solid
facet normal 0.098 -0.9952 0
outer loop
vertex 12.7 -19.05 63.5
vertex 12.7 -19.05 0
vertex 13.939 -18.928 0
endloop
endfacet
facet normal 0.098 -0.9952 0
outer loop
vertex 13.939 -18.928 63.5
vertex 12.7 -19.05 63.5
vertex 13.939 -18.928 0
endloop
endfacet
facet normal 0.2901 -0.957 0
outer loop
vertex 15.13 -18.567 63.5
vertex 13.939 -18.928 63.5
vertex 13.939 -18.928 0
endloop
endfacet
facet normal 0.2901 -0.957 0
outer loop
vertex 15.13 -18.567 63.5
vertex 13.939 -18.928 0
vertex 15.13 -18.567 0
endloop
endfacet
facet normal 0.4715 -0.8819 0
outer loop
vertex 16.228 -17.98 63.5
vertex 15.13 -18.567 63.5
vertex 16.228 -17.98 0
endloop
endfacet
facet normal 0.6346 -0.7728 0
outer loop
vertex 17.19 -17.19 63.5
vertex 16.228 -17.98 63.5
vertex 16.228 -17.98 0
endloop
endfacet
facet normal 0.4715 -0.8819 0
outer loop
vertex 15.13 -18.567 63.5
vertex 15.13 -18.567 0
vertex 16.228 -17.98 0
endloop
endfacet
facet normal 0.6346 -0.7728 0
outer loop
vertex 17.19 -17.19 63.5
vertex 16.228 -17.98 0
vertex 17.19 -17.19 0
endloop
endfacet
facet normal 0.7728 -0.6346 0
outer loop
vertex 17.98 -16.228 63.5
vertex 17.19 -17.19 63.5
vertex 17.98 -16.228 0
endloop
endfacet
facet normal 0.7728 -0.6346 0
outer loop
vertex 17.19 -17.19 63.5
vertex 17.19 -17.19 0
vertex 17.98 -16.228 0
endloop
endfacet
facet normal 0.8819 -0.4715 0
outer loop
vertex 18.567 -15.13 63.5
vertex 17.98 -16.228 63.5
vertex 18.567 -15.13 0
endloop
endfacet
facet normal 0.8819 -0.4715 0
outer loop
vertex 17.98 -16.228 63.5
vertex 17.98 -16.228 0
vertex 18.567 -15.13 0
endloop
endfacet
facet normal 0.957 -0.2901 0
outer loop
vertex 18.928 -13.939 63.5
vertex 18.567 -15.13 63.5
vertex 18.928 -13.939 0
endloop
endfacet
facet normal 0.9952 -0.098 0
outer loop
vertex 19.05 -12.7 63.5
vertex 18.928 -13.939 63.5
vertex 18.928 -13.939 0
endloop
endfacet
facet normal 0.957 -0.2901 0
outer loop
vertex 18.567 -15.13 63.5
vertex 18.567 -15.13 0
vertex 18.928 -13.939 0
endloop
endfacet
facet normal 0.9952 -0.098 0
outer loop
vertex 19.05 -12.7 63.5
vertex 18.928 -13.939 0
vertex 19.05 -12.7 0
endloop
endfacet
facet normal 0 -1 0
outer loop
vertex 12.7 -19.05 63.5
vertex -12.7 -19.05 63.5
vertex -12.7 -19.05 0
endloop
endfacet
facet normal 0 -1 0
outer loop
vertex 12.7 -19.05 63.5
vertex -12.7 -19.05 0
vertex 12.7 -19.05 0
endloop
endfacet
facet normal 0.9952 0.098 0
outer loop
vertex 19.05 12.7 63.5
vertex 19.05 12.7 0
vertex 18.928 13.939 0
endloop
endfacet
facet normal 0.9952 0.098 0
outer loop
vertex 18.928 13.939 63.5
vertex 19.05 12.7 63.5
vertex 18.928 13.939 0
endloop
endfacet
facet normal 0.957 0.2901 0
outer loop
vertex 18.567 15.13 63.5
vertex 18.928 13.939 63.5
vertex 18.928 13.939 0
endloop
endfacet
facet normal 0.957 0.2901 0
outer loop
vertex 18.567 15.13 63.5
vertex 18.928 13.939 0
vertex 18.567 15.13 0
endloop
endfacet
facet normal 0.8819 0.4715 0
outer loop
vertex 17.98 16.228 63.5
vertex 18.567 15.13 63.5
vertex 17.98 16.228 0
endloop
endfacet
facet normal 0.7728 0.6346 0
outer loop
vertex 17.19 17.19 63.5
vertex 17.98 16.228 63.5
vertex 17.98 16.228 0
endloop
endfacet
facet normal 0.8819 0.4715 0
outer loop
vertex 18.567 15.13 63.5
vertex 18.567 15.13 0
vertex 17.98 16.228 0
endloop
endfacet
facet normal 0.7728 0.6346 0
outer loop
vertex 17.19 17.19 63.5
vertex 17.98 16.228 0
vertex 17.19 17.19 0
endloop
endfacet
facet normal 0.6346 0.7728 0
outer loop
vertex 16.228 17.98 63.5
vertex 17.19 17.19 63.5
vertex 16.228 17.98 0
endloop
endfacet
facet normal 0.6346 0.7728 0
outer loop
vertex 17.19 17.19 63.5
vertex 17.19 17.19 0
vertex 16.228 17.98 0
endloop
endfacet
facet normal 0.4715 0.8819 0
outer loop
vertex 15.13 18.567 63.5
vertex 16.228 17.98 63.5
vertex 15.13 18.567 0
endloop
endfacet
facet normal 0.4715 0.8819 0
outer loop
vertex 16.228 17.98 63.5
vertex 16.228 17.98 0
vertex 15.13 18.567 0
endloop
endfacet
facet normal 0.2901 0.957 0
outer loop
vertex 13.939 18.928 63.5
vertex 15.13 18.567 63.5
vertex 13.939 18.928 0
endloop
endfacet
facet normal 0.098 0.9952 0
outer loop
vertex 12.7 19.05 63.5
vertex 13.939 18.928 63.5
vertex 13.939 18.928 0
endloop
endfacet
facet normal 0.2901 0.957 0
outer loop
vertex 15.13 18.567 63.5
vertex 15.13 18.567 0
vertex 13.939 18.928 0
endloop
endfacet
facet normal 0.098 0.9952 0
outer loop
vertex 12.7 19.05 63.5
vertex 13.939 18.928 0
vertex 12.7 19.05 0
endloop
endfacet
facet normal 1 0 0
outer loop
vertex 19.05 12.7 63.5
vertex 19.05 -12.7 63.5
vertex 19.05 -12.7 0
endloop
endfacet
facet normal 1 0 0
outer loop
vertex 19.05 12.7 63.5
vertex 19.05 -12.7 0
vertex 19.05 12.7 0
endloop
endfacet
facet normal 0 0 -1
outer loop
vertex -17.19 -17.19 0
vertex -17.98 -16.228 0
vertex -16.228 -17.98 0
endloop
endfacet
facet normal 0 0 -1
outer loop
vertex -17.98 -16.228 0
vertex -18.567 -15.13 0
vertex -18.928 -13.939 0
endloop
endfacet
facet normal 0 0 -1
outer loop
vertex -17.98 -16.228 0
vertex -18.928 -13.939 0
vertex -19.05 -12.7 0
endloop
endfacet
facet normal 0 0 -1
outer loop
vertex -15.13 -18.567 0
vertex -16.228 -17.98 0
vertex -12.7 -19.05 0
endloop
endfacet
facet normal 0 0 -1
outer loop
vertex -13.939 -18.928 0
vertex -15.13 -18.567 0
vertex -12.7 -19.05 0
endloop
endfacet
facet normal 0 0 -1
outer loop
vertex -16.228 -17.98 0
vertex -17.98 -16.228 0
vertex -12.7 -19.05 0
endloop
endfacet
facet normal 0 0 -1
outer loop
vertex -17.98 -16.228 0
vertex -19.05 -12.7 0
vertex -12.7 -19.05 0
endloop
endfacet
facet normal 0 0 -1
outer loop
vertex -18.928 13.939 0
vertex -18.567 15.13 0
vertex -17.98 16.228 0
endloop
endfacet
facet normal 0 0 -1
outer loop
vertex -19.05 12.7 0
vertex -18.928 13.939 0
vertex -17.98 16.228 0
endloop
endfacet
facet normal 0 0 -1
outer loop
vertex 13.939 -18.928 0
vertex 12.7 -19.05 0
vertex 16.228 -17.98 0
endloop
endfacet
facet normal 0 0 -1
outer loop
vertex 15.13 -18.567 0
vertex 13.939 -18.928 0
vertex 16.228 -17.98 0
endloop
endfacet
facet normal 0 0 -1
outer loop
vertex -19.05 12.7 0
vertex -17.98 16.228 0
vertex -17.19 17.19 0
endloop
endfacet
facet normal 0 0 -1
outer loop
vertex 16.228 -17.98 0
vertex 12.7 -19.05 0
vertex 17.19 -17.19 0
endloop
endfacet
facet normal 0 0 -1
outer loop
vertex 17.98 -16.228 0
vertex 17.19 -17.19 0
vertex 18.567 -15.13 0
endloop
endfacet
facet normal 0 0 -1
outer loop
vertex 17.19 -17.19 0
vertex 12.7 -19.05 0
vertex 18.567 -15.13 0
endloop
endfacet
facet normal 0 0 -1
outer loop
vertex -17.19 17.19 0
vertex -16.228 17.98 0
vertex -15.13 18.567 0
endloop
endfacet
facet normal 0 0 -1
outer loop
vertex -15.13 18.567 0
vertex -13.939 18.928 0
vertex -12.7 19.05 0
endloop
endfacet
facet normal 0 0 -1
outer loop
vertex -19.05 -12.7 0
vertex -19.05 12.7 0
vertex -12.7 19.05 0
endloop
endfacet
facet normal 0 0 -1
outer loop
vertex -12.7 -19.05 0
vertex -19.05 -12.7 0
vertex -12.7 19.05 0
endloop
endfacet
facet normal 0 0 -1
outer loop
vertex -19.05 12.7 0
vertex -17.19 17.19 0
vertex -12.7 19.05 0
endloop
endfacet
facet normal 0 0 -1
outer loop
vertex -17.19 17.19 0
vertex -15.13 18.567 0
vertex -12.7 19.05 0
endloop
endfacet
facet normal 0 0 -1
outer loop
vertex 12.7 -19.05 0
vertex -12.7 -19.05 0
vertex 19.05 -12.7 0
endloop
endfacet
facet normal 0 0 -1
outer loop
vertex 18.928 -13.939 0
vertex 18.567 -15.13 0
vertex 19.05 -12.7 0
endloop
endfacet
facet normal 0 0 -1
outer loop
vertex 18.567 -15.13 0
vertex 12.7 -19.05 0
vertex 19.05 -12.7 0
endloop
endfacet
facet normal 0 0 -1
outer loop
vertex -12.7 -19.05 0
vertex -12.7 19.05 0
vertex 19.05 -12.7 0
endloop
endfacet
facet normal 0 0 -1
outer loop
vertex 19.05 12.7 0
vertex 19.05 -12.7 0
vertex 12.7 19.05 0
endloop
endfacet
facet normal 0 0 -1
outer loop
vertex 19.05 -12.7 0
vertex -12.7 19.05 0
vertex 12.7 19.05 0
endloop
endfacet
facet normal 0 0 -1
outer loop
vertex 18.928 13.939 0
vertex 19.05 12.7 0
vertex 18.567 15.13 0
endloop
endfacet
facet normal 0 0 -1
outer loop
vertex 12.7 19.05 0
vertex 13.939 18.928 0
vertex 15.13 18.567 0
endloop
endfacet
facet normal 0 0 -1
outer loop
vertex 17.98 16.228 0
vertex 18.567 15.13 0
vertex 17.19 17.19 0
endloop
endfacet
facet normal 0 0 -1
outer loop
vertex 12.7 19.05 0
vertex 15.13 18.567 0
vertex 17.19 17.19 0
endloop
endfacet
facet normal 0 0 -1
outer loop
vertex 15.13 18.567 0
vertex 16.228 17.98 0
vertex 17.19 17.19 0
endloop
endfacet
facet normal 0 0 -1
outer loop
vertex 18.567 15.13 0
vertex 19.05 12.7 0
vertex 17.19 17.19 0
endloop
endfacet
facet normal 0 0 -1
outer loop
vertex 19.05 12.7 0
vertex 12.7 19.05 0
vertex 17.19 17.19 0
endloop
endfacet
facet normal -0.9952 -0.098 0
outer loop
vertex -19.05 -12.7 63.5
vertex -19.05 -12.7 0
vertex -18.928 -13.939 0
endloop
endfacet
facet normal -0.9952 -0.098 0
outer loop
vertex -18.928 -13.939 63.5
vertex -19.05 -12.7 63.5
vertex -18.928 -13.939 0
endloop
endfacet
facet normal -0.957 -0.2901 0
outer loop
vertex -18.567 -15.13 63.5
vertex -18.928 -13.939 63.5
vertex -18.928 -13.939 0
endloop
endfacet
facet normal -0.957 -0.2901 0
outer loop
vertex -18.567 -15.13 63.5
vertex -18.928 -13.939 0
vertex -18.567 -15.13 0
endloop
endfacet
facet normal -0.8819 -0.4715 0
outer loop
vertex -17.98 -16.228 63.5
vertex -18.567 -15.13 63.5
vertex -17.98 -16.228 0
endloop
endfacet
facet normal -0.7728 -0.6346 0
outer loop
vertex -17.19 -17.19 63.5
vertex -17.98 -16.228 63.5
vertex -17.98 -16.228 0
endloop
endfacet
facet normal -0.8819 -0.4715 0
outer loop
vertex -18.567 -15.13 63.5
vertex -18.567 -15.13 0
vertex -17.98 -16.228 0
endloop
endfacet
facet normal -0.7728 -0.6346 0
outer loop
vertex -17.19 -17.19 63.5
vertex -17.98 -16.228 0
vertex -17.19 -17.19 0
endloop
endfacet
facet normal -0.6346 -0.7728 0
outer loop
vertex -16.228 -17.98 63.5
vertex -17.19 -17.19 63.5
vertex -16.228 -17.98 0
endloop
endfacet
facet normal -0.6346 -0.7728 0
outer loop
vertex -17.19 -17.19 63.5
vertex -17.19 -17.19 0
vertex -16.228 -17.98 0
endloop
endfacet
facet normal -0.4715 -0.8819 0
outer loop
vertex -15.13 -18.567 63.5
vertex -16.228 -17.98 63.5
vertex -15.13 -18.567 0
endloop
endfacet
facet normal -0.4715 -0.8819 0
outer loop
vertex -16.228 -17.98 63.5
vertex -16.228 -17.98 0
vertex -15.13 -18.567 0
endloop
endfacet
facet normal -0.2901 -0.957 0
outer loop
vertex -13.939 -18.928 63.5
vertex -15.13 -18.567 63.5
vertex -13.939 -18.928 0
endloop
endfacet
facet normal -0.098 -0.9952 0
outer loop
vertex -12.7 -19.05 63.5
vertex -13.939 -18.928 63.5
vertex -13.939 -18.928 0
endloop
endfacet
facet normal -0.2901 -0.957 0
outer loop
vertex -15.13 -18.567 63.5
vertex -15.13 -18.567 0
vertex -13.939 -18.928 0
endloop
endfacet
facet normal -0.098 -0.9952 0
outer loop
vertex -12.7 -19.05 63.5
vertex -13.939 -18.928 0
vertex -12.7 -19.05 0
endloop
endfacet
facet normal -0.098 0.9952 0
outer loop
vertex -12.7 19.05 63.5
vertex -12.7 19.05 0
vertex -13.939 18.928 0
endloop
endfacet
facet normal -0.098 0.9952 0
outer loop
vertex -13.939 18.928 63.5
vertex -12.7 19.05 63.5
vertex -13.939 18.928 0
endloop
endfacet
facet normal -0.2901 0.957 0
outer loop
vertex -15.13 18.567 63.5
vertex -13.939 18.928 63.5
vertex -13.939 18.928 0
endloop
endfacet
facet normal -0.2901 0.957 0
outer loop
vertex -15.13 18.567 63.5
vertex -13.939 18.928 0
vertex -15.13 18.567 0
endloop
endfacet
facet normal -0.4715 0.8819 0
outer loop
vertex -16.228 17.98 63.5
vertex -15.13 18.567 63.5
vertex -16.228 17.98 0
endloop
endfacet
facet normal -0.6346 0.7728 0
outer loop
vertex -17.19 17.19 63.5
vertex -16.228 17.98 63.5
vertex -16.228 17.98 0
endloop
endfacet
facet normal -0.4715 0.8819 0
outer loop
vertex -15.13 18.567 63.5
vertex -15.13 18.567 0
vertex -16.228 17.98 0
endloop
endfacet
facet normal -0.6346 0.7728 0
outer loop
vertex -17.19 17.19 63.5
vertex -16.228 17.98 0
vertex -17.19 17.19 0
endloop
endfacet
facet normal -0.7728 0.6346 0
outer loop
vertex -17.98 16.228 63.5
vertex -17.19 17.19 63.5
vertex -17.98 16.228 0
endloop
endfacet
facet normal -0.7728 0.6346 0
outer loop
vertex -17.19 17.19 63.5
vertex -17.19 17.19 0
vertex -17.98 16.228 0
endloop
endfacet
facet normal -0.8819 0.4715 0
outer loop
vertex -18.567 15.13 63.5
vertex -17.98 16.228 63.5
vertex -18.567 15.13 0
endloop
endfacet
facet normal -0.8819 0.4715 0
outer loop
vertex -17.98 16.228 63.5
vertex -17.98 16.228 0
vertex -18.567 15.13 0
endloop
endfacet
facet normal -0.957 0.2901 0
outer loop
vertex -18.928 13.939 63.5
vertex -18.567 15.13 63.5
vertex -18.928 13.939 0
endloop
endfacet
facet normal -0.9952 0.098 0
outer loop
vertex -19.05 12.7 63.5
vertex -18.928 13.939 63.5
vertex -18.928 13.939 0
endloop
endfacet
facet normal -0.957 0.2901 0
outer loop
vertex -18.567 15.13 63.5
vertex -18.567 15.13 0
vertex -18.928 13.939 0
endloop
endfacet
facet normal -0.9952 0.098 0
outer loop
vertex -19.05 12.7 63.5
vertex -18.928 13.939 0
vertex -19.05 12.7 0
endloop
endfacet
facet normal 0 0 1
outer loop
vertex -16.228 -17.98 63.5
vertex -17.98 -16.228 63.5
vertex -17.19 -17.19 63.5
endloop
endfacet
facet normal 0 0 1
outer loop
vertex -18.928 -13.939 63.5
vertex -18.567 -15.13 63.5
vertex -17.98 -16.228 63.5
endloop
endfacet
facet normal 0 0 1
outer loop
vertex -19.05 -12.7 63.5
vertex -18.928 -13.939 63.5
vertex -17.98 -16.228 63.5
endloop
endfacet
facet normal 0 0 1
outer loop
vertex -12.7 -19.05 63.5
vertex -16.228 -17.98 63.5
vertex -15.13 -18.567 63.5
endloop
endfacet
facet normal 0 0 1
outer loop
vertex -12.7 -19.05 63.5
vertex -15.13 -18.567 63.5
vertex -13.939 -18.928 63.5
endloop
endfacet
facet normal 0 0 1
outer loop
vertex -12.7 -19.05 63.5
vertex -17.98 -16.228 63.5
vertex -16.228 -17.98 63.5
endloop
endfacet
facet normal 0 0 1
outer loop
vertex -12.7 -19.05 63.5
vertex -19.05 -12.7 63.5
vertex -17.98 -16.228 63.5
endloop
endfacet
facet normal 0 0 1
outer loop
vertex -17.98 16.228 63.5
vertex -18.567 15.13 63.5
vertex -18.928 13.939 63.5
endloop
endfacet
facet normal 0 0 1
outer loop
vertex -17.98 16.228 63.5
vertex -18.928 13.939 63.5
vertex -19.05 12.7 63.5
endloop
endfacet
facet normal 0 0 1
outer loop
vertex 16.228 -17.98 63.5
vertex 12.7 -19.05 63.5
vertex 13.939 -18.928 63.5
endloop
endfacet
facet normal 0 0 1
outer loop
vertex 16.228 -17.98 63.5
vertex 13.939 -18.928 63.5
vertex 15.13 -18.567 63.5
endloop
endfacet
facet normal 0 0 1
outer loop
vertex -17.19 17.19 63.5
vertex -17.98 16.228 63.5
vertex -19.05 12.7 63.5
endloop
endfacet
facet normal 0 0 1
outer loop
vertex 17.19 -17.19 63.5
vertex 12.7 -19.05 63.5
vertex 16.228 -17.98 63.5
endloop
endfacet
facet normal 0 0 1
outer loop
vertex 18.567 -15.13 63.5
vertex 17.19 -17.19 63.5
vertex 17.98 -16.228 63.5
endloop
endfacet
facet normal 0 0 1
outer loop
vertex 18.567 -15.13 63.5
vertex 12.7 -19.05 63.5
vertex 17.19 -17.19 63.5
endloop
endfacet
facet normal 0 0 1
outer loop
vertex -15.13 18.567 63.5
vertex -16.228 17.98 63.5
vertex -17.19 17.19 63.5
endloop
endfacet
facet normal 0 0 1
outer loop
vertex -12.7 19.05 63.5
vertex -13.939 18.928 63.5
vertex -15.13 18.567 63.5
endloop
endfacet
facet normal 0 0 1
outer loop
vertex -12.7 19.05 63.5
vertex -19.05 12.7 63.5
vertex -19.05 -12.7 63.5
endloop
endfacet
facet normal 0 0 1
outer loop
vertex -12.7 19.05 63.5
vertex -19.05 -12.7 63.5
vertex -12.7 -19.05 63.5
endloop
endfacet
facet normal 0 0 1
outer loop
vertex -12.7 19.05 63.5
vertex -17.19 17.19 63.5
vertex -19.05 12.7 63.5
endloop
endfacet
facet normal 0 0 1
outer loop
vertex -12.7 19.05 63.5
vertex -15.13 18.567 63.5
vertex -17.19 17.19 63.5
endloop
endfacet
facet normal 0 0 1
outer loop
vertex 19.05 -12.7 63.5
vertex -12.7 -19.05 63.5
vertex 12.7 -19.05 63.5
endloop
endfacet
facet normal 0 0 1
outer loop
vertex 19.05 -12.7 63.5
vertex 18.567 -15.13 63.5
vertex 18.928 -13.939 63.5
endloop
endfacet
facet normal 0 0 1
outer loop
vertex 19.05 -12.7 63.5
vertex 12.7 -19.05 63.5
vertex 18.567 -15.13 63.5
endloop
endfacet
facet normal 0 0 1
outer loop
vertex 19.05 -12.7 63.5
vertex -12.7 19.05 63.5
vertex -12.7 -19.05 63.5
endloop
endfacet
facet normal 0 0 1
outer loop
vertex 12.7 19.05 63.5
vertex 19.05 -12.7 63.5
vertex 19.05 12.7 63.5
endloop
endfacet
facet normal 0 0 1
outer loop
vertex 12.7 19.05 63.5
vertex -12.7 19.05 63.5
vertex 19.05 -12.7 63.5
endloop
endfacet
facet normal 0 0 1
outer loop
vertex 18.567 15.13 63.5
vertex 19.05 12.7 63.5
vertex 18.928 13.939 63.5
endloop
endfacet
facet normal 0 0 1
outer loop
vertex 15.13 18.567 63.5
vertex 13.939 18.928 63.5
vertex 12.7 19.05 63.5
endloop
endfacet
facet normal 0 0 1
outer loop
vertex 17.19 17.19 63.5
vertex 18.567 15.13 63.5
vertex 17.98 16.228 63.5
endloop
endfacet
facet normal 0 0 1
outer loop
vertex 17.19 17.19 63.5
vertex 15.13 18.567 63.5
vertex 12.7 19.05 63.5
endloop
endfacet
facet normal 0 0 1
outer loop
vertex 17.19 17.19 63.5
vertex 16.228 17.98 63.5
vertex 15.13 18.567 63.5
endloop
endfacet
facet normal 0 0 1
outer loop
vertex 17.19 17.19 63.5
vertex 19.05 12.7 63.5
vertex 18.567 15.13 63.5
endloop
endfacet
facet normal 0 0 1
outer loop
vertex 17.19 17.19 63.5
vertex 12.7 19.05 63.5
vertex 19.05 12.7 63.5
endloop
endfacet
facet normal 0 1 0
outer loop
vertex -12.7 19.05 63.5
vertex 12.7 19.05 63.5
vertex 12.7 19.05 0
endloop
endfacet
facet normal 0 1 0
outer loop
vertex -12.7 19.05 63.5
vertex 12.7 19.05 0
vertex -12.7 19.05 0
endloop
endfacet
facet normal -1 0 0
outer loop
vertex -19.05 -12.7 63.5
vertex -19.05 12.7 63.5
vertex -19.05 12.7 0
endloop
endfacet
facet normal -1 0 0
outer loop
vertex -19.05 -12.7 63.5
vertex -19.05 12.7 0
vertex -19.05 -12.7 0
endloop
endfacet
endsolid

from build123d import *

# Parameters (mm, degrees)
F1_DEPTH = 63.5
F2_W     = 12.7
F2_H     = 190.5
F4_DEPTH = 0.254
F3_W     = 12.7
F3_H     = 190.5
F5_DEPTH = 0.254


with BuildPart() as f1:
    # F0 (on Top) → F1 (new body)
    with BuildSketch(Plane.XY):
        with BuildLine():
            ThreePointArc((19.05, 12.7), (17.190128, 17.190128), (12.7, 19.05))
            Line((12.7, 19.05), (-12.7, 19.05))
            ThreePointArc((-12.7, 19.05), (-17.190128, 17.190128), (-19.05, 12.7))
            Line((-19.05, 12.7), (-19.05, -12.7))
            ThreePointArc((-19.05, -12.7), (-17.190128, -17.190128), (-12.7, -19.05))
            Line((-12.7, -19.05), (12.7, -19.05))
            ThreePointArc((12.7, -19.05), (17.190128, -17.190128), (19.05, -12.7))
            Line((19.05, -12.7), (19.05, 12.7))
        make_face()
    extrude(amount=F1_DEPTH)


with BuildPart() as f4:
    # F2 (on Right) → F4 (new body)
    with BuildSketch(Plane.YZ):
        with Locations((-192.550282, 22.601065)):
            Rectangle(F2_W, F2_H)
    extrude(amount=F4_DEPTH)


with BuildPart() as f5:
    # F3 (on Right) → F5 (new body)
    with BuildSketch(Plane.YZ):
        with Locations((175.864179, 24.777815)):
            Rectangle(F3_W, F3_H)
    extrude(amount=F5_DEPTH)


solid = f1.part
